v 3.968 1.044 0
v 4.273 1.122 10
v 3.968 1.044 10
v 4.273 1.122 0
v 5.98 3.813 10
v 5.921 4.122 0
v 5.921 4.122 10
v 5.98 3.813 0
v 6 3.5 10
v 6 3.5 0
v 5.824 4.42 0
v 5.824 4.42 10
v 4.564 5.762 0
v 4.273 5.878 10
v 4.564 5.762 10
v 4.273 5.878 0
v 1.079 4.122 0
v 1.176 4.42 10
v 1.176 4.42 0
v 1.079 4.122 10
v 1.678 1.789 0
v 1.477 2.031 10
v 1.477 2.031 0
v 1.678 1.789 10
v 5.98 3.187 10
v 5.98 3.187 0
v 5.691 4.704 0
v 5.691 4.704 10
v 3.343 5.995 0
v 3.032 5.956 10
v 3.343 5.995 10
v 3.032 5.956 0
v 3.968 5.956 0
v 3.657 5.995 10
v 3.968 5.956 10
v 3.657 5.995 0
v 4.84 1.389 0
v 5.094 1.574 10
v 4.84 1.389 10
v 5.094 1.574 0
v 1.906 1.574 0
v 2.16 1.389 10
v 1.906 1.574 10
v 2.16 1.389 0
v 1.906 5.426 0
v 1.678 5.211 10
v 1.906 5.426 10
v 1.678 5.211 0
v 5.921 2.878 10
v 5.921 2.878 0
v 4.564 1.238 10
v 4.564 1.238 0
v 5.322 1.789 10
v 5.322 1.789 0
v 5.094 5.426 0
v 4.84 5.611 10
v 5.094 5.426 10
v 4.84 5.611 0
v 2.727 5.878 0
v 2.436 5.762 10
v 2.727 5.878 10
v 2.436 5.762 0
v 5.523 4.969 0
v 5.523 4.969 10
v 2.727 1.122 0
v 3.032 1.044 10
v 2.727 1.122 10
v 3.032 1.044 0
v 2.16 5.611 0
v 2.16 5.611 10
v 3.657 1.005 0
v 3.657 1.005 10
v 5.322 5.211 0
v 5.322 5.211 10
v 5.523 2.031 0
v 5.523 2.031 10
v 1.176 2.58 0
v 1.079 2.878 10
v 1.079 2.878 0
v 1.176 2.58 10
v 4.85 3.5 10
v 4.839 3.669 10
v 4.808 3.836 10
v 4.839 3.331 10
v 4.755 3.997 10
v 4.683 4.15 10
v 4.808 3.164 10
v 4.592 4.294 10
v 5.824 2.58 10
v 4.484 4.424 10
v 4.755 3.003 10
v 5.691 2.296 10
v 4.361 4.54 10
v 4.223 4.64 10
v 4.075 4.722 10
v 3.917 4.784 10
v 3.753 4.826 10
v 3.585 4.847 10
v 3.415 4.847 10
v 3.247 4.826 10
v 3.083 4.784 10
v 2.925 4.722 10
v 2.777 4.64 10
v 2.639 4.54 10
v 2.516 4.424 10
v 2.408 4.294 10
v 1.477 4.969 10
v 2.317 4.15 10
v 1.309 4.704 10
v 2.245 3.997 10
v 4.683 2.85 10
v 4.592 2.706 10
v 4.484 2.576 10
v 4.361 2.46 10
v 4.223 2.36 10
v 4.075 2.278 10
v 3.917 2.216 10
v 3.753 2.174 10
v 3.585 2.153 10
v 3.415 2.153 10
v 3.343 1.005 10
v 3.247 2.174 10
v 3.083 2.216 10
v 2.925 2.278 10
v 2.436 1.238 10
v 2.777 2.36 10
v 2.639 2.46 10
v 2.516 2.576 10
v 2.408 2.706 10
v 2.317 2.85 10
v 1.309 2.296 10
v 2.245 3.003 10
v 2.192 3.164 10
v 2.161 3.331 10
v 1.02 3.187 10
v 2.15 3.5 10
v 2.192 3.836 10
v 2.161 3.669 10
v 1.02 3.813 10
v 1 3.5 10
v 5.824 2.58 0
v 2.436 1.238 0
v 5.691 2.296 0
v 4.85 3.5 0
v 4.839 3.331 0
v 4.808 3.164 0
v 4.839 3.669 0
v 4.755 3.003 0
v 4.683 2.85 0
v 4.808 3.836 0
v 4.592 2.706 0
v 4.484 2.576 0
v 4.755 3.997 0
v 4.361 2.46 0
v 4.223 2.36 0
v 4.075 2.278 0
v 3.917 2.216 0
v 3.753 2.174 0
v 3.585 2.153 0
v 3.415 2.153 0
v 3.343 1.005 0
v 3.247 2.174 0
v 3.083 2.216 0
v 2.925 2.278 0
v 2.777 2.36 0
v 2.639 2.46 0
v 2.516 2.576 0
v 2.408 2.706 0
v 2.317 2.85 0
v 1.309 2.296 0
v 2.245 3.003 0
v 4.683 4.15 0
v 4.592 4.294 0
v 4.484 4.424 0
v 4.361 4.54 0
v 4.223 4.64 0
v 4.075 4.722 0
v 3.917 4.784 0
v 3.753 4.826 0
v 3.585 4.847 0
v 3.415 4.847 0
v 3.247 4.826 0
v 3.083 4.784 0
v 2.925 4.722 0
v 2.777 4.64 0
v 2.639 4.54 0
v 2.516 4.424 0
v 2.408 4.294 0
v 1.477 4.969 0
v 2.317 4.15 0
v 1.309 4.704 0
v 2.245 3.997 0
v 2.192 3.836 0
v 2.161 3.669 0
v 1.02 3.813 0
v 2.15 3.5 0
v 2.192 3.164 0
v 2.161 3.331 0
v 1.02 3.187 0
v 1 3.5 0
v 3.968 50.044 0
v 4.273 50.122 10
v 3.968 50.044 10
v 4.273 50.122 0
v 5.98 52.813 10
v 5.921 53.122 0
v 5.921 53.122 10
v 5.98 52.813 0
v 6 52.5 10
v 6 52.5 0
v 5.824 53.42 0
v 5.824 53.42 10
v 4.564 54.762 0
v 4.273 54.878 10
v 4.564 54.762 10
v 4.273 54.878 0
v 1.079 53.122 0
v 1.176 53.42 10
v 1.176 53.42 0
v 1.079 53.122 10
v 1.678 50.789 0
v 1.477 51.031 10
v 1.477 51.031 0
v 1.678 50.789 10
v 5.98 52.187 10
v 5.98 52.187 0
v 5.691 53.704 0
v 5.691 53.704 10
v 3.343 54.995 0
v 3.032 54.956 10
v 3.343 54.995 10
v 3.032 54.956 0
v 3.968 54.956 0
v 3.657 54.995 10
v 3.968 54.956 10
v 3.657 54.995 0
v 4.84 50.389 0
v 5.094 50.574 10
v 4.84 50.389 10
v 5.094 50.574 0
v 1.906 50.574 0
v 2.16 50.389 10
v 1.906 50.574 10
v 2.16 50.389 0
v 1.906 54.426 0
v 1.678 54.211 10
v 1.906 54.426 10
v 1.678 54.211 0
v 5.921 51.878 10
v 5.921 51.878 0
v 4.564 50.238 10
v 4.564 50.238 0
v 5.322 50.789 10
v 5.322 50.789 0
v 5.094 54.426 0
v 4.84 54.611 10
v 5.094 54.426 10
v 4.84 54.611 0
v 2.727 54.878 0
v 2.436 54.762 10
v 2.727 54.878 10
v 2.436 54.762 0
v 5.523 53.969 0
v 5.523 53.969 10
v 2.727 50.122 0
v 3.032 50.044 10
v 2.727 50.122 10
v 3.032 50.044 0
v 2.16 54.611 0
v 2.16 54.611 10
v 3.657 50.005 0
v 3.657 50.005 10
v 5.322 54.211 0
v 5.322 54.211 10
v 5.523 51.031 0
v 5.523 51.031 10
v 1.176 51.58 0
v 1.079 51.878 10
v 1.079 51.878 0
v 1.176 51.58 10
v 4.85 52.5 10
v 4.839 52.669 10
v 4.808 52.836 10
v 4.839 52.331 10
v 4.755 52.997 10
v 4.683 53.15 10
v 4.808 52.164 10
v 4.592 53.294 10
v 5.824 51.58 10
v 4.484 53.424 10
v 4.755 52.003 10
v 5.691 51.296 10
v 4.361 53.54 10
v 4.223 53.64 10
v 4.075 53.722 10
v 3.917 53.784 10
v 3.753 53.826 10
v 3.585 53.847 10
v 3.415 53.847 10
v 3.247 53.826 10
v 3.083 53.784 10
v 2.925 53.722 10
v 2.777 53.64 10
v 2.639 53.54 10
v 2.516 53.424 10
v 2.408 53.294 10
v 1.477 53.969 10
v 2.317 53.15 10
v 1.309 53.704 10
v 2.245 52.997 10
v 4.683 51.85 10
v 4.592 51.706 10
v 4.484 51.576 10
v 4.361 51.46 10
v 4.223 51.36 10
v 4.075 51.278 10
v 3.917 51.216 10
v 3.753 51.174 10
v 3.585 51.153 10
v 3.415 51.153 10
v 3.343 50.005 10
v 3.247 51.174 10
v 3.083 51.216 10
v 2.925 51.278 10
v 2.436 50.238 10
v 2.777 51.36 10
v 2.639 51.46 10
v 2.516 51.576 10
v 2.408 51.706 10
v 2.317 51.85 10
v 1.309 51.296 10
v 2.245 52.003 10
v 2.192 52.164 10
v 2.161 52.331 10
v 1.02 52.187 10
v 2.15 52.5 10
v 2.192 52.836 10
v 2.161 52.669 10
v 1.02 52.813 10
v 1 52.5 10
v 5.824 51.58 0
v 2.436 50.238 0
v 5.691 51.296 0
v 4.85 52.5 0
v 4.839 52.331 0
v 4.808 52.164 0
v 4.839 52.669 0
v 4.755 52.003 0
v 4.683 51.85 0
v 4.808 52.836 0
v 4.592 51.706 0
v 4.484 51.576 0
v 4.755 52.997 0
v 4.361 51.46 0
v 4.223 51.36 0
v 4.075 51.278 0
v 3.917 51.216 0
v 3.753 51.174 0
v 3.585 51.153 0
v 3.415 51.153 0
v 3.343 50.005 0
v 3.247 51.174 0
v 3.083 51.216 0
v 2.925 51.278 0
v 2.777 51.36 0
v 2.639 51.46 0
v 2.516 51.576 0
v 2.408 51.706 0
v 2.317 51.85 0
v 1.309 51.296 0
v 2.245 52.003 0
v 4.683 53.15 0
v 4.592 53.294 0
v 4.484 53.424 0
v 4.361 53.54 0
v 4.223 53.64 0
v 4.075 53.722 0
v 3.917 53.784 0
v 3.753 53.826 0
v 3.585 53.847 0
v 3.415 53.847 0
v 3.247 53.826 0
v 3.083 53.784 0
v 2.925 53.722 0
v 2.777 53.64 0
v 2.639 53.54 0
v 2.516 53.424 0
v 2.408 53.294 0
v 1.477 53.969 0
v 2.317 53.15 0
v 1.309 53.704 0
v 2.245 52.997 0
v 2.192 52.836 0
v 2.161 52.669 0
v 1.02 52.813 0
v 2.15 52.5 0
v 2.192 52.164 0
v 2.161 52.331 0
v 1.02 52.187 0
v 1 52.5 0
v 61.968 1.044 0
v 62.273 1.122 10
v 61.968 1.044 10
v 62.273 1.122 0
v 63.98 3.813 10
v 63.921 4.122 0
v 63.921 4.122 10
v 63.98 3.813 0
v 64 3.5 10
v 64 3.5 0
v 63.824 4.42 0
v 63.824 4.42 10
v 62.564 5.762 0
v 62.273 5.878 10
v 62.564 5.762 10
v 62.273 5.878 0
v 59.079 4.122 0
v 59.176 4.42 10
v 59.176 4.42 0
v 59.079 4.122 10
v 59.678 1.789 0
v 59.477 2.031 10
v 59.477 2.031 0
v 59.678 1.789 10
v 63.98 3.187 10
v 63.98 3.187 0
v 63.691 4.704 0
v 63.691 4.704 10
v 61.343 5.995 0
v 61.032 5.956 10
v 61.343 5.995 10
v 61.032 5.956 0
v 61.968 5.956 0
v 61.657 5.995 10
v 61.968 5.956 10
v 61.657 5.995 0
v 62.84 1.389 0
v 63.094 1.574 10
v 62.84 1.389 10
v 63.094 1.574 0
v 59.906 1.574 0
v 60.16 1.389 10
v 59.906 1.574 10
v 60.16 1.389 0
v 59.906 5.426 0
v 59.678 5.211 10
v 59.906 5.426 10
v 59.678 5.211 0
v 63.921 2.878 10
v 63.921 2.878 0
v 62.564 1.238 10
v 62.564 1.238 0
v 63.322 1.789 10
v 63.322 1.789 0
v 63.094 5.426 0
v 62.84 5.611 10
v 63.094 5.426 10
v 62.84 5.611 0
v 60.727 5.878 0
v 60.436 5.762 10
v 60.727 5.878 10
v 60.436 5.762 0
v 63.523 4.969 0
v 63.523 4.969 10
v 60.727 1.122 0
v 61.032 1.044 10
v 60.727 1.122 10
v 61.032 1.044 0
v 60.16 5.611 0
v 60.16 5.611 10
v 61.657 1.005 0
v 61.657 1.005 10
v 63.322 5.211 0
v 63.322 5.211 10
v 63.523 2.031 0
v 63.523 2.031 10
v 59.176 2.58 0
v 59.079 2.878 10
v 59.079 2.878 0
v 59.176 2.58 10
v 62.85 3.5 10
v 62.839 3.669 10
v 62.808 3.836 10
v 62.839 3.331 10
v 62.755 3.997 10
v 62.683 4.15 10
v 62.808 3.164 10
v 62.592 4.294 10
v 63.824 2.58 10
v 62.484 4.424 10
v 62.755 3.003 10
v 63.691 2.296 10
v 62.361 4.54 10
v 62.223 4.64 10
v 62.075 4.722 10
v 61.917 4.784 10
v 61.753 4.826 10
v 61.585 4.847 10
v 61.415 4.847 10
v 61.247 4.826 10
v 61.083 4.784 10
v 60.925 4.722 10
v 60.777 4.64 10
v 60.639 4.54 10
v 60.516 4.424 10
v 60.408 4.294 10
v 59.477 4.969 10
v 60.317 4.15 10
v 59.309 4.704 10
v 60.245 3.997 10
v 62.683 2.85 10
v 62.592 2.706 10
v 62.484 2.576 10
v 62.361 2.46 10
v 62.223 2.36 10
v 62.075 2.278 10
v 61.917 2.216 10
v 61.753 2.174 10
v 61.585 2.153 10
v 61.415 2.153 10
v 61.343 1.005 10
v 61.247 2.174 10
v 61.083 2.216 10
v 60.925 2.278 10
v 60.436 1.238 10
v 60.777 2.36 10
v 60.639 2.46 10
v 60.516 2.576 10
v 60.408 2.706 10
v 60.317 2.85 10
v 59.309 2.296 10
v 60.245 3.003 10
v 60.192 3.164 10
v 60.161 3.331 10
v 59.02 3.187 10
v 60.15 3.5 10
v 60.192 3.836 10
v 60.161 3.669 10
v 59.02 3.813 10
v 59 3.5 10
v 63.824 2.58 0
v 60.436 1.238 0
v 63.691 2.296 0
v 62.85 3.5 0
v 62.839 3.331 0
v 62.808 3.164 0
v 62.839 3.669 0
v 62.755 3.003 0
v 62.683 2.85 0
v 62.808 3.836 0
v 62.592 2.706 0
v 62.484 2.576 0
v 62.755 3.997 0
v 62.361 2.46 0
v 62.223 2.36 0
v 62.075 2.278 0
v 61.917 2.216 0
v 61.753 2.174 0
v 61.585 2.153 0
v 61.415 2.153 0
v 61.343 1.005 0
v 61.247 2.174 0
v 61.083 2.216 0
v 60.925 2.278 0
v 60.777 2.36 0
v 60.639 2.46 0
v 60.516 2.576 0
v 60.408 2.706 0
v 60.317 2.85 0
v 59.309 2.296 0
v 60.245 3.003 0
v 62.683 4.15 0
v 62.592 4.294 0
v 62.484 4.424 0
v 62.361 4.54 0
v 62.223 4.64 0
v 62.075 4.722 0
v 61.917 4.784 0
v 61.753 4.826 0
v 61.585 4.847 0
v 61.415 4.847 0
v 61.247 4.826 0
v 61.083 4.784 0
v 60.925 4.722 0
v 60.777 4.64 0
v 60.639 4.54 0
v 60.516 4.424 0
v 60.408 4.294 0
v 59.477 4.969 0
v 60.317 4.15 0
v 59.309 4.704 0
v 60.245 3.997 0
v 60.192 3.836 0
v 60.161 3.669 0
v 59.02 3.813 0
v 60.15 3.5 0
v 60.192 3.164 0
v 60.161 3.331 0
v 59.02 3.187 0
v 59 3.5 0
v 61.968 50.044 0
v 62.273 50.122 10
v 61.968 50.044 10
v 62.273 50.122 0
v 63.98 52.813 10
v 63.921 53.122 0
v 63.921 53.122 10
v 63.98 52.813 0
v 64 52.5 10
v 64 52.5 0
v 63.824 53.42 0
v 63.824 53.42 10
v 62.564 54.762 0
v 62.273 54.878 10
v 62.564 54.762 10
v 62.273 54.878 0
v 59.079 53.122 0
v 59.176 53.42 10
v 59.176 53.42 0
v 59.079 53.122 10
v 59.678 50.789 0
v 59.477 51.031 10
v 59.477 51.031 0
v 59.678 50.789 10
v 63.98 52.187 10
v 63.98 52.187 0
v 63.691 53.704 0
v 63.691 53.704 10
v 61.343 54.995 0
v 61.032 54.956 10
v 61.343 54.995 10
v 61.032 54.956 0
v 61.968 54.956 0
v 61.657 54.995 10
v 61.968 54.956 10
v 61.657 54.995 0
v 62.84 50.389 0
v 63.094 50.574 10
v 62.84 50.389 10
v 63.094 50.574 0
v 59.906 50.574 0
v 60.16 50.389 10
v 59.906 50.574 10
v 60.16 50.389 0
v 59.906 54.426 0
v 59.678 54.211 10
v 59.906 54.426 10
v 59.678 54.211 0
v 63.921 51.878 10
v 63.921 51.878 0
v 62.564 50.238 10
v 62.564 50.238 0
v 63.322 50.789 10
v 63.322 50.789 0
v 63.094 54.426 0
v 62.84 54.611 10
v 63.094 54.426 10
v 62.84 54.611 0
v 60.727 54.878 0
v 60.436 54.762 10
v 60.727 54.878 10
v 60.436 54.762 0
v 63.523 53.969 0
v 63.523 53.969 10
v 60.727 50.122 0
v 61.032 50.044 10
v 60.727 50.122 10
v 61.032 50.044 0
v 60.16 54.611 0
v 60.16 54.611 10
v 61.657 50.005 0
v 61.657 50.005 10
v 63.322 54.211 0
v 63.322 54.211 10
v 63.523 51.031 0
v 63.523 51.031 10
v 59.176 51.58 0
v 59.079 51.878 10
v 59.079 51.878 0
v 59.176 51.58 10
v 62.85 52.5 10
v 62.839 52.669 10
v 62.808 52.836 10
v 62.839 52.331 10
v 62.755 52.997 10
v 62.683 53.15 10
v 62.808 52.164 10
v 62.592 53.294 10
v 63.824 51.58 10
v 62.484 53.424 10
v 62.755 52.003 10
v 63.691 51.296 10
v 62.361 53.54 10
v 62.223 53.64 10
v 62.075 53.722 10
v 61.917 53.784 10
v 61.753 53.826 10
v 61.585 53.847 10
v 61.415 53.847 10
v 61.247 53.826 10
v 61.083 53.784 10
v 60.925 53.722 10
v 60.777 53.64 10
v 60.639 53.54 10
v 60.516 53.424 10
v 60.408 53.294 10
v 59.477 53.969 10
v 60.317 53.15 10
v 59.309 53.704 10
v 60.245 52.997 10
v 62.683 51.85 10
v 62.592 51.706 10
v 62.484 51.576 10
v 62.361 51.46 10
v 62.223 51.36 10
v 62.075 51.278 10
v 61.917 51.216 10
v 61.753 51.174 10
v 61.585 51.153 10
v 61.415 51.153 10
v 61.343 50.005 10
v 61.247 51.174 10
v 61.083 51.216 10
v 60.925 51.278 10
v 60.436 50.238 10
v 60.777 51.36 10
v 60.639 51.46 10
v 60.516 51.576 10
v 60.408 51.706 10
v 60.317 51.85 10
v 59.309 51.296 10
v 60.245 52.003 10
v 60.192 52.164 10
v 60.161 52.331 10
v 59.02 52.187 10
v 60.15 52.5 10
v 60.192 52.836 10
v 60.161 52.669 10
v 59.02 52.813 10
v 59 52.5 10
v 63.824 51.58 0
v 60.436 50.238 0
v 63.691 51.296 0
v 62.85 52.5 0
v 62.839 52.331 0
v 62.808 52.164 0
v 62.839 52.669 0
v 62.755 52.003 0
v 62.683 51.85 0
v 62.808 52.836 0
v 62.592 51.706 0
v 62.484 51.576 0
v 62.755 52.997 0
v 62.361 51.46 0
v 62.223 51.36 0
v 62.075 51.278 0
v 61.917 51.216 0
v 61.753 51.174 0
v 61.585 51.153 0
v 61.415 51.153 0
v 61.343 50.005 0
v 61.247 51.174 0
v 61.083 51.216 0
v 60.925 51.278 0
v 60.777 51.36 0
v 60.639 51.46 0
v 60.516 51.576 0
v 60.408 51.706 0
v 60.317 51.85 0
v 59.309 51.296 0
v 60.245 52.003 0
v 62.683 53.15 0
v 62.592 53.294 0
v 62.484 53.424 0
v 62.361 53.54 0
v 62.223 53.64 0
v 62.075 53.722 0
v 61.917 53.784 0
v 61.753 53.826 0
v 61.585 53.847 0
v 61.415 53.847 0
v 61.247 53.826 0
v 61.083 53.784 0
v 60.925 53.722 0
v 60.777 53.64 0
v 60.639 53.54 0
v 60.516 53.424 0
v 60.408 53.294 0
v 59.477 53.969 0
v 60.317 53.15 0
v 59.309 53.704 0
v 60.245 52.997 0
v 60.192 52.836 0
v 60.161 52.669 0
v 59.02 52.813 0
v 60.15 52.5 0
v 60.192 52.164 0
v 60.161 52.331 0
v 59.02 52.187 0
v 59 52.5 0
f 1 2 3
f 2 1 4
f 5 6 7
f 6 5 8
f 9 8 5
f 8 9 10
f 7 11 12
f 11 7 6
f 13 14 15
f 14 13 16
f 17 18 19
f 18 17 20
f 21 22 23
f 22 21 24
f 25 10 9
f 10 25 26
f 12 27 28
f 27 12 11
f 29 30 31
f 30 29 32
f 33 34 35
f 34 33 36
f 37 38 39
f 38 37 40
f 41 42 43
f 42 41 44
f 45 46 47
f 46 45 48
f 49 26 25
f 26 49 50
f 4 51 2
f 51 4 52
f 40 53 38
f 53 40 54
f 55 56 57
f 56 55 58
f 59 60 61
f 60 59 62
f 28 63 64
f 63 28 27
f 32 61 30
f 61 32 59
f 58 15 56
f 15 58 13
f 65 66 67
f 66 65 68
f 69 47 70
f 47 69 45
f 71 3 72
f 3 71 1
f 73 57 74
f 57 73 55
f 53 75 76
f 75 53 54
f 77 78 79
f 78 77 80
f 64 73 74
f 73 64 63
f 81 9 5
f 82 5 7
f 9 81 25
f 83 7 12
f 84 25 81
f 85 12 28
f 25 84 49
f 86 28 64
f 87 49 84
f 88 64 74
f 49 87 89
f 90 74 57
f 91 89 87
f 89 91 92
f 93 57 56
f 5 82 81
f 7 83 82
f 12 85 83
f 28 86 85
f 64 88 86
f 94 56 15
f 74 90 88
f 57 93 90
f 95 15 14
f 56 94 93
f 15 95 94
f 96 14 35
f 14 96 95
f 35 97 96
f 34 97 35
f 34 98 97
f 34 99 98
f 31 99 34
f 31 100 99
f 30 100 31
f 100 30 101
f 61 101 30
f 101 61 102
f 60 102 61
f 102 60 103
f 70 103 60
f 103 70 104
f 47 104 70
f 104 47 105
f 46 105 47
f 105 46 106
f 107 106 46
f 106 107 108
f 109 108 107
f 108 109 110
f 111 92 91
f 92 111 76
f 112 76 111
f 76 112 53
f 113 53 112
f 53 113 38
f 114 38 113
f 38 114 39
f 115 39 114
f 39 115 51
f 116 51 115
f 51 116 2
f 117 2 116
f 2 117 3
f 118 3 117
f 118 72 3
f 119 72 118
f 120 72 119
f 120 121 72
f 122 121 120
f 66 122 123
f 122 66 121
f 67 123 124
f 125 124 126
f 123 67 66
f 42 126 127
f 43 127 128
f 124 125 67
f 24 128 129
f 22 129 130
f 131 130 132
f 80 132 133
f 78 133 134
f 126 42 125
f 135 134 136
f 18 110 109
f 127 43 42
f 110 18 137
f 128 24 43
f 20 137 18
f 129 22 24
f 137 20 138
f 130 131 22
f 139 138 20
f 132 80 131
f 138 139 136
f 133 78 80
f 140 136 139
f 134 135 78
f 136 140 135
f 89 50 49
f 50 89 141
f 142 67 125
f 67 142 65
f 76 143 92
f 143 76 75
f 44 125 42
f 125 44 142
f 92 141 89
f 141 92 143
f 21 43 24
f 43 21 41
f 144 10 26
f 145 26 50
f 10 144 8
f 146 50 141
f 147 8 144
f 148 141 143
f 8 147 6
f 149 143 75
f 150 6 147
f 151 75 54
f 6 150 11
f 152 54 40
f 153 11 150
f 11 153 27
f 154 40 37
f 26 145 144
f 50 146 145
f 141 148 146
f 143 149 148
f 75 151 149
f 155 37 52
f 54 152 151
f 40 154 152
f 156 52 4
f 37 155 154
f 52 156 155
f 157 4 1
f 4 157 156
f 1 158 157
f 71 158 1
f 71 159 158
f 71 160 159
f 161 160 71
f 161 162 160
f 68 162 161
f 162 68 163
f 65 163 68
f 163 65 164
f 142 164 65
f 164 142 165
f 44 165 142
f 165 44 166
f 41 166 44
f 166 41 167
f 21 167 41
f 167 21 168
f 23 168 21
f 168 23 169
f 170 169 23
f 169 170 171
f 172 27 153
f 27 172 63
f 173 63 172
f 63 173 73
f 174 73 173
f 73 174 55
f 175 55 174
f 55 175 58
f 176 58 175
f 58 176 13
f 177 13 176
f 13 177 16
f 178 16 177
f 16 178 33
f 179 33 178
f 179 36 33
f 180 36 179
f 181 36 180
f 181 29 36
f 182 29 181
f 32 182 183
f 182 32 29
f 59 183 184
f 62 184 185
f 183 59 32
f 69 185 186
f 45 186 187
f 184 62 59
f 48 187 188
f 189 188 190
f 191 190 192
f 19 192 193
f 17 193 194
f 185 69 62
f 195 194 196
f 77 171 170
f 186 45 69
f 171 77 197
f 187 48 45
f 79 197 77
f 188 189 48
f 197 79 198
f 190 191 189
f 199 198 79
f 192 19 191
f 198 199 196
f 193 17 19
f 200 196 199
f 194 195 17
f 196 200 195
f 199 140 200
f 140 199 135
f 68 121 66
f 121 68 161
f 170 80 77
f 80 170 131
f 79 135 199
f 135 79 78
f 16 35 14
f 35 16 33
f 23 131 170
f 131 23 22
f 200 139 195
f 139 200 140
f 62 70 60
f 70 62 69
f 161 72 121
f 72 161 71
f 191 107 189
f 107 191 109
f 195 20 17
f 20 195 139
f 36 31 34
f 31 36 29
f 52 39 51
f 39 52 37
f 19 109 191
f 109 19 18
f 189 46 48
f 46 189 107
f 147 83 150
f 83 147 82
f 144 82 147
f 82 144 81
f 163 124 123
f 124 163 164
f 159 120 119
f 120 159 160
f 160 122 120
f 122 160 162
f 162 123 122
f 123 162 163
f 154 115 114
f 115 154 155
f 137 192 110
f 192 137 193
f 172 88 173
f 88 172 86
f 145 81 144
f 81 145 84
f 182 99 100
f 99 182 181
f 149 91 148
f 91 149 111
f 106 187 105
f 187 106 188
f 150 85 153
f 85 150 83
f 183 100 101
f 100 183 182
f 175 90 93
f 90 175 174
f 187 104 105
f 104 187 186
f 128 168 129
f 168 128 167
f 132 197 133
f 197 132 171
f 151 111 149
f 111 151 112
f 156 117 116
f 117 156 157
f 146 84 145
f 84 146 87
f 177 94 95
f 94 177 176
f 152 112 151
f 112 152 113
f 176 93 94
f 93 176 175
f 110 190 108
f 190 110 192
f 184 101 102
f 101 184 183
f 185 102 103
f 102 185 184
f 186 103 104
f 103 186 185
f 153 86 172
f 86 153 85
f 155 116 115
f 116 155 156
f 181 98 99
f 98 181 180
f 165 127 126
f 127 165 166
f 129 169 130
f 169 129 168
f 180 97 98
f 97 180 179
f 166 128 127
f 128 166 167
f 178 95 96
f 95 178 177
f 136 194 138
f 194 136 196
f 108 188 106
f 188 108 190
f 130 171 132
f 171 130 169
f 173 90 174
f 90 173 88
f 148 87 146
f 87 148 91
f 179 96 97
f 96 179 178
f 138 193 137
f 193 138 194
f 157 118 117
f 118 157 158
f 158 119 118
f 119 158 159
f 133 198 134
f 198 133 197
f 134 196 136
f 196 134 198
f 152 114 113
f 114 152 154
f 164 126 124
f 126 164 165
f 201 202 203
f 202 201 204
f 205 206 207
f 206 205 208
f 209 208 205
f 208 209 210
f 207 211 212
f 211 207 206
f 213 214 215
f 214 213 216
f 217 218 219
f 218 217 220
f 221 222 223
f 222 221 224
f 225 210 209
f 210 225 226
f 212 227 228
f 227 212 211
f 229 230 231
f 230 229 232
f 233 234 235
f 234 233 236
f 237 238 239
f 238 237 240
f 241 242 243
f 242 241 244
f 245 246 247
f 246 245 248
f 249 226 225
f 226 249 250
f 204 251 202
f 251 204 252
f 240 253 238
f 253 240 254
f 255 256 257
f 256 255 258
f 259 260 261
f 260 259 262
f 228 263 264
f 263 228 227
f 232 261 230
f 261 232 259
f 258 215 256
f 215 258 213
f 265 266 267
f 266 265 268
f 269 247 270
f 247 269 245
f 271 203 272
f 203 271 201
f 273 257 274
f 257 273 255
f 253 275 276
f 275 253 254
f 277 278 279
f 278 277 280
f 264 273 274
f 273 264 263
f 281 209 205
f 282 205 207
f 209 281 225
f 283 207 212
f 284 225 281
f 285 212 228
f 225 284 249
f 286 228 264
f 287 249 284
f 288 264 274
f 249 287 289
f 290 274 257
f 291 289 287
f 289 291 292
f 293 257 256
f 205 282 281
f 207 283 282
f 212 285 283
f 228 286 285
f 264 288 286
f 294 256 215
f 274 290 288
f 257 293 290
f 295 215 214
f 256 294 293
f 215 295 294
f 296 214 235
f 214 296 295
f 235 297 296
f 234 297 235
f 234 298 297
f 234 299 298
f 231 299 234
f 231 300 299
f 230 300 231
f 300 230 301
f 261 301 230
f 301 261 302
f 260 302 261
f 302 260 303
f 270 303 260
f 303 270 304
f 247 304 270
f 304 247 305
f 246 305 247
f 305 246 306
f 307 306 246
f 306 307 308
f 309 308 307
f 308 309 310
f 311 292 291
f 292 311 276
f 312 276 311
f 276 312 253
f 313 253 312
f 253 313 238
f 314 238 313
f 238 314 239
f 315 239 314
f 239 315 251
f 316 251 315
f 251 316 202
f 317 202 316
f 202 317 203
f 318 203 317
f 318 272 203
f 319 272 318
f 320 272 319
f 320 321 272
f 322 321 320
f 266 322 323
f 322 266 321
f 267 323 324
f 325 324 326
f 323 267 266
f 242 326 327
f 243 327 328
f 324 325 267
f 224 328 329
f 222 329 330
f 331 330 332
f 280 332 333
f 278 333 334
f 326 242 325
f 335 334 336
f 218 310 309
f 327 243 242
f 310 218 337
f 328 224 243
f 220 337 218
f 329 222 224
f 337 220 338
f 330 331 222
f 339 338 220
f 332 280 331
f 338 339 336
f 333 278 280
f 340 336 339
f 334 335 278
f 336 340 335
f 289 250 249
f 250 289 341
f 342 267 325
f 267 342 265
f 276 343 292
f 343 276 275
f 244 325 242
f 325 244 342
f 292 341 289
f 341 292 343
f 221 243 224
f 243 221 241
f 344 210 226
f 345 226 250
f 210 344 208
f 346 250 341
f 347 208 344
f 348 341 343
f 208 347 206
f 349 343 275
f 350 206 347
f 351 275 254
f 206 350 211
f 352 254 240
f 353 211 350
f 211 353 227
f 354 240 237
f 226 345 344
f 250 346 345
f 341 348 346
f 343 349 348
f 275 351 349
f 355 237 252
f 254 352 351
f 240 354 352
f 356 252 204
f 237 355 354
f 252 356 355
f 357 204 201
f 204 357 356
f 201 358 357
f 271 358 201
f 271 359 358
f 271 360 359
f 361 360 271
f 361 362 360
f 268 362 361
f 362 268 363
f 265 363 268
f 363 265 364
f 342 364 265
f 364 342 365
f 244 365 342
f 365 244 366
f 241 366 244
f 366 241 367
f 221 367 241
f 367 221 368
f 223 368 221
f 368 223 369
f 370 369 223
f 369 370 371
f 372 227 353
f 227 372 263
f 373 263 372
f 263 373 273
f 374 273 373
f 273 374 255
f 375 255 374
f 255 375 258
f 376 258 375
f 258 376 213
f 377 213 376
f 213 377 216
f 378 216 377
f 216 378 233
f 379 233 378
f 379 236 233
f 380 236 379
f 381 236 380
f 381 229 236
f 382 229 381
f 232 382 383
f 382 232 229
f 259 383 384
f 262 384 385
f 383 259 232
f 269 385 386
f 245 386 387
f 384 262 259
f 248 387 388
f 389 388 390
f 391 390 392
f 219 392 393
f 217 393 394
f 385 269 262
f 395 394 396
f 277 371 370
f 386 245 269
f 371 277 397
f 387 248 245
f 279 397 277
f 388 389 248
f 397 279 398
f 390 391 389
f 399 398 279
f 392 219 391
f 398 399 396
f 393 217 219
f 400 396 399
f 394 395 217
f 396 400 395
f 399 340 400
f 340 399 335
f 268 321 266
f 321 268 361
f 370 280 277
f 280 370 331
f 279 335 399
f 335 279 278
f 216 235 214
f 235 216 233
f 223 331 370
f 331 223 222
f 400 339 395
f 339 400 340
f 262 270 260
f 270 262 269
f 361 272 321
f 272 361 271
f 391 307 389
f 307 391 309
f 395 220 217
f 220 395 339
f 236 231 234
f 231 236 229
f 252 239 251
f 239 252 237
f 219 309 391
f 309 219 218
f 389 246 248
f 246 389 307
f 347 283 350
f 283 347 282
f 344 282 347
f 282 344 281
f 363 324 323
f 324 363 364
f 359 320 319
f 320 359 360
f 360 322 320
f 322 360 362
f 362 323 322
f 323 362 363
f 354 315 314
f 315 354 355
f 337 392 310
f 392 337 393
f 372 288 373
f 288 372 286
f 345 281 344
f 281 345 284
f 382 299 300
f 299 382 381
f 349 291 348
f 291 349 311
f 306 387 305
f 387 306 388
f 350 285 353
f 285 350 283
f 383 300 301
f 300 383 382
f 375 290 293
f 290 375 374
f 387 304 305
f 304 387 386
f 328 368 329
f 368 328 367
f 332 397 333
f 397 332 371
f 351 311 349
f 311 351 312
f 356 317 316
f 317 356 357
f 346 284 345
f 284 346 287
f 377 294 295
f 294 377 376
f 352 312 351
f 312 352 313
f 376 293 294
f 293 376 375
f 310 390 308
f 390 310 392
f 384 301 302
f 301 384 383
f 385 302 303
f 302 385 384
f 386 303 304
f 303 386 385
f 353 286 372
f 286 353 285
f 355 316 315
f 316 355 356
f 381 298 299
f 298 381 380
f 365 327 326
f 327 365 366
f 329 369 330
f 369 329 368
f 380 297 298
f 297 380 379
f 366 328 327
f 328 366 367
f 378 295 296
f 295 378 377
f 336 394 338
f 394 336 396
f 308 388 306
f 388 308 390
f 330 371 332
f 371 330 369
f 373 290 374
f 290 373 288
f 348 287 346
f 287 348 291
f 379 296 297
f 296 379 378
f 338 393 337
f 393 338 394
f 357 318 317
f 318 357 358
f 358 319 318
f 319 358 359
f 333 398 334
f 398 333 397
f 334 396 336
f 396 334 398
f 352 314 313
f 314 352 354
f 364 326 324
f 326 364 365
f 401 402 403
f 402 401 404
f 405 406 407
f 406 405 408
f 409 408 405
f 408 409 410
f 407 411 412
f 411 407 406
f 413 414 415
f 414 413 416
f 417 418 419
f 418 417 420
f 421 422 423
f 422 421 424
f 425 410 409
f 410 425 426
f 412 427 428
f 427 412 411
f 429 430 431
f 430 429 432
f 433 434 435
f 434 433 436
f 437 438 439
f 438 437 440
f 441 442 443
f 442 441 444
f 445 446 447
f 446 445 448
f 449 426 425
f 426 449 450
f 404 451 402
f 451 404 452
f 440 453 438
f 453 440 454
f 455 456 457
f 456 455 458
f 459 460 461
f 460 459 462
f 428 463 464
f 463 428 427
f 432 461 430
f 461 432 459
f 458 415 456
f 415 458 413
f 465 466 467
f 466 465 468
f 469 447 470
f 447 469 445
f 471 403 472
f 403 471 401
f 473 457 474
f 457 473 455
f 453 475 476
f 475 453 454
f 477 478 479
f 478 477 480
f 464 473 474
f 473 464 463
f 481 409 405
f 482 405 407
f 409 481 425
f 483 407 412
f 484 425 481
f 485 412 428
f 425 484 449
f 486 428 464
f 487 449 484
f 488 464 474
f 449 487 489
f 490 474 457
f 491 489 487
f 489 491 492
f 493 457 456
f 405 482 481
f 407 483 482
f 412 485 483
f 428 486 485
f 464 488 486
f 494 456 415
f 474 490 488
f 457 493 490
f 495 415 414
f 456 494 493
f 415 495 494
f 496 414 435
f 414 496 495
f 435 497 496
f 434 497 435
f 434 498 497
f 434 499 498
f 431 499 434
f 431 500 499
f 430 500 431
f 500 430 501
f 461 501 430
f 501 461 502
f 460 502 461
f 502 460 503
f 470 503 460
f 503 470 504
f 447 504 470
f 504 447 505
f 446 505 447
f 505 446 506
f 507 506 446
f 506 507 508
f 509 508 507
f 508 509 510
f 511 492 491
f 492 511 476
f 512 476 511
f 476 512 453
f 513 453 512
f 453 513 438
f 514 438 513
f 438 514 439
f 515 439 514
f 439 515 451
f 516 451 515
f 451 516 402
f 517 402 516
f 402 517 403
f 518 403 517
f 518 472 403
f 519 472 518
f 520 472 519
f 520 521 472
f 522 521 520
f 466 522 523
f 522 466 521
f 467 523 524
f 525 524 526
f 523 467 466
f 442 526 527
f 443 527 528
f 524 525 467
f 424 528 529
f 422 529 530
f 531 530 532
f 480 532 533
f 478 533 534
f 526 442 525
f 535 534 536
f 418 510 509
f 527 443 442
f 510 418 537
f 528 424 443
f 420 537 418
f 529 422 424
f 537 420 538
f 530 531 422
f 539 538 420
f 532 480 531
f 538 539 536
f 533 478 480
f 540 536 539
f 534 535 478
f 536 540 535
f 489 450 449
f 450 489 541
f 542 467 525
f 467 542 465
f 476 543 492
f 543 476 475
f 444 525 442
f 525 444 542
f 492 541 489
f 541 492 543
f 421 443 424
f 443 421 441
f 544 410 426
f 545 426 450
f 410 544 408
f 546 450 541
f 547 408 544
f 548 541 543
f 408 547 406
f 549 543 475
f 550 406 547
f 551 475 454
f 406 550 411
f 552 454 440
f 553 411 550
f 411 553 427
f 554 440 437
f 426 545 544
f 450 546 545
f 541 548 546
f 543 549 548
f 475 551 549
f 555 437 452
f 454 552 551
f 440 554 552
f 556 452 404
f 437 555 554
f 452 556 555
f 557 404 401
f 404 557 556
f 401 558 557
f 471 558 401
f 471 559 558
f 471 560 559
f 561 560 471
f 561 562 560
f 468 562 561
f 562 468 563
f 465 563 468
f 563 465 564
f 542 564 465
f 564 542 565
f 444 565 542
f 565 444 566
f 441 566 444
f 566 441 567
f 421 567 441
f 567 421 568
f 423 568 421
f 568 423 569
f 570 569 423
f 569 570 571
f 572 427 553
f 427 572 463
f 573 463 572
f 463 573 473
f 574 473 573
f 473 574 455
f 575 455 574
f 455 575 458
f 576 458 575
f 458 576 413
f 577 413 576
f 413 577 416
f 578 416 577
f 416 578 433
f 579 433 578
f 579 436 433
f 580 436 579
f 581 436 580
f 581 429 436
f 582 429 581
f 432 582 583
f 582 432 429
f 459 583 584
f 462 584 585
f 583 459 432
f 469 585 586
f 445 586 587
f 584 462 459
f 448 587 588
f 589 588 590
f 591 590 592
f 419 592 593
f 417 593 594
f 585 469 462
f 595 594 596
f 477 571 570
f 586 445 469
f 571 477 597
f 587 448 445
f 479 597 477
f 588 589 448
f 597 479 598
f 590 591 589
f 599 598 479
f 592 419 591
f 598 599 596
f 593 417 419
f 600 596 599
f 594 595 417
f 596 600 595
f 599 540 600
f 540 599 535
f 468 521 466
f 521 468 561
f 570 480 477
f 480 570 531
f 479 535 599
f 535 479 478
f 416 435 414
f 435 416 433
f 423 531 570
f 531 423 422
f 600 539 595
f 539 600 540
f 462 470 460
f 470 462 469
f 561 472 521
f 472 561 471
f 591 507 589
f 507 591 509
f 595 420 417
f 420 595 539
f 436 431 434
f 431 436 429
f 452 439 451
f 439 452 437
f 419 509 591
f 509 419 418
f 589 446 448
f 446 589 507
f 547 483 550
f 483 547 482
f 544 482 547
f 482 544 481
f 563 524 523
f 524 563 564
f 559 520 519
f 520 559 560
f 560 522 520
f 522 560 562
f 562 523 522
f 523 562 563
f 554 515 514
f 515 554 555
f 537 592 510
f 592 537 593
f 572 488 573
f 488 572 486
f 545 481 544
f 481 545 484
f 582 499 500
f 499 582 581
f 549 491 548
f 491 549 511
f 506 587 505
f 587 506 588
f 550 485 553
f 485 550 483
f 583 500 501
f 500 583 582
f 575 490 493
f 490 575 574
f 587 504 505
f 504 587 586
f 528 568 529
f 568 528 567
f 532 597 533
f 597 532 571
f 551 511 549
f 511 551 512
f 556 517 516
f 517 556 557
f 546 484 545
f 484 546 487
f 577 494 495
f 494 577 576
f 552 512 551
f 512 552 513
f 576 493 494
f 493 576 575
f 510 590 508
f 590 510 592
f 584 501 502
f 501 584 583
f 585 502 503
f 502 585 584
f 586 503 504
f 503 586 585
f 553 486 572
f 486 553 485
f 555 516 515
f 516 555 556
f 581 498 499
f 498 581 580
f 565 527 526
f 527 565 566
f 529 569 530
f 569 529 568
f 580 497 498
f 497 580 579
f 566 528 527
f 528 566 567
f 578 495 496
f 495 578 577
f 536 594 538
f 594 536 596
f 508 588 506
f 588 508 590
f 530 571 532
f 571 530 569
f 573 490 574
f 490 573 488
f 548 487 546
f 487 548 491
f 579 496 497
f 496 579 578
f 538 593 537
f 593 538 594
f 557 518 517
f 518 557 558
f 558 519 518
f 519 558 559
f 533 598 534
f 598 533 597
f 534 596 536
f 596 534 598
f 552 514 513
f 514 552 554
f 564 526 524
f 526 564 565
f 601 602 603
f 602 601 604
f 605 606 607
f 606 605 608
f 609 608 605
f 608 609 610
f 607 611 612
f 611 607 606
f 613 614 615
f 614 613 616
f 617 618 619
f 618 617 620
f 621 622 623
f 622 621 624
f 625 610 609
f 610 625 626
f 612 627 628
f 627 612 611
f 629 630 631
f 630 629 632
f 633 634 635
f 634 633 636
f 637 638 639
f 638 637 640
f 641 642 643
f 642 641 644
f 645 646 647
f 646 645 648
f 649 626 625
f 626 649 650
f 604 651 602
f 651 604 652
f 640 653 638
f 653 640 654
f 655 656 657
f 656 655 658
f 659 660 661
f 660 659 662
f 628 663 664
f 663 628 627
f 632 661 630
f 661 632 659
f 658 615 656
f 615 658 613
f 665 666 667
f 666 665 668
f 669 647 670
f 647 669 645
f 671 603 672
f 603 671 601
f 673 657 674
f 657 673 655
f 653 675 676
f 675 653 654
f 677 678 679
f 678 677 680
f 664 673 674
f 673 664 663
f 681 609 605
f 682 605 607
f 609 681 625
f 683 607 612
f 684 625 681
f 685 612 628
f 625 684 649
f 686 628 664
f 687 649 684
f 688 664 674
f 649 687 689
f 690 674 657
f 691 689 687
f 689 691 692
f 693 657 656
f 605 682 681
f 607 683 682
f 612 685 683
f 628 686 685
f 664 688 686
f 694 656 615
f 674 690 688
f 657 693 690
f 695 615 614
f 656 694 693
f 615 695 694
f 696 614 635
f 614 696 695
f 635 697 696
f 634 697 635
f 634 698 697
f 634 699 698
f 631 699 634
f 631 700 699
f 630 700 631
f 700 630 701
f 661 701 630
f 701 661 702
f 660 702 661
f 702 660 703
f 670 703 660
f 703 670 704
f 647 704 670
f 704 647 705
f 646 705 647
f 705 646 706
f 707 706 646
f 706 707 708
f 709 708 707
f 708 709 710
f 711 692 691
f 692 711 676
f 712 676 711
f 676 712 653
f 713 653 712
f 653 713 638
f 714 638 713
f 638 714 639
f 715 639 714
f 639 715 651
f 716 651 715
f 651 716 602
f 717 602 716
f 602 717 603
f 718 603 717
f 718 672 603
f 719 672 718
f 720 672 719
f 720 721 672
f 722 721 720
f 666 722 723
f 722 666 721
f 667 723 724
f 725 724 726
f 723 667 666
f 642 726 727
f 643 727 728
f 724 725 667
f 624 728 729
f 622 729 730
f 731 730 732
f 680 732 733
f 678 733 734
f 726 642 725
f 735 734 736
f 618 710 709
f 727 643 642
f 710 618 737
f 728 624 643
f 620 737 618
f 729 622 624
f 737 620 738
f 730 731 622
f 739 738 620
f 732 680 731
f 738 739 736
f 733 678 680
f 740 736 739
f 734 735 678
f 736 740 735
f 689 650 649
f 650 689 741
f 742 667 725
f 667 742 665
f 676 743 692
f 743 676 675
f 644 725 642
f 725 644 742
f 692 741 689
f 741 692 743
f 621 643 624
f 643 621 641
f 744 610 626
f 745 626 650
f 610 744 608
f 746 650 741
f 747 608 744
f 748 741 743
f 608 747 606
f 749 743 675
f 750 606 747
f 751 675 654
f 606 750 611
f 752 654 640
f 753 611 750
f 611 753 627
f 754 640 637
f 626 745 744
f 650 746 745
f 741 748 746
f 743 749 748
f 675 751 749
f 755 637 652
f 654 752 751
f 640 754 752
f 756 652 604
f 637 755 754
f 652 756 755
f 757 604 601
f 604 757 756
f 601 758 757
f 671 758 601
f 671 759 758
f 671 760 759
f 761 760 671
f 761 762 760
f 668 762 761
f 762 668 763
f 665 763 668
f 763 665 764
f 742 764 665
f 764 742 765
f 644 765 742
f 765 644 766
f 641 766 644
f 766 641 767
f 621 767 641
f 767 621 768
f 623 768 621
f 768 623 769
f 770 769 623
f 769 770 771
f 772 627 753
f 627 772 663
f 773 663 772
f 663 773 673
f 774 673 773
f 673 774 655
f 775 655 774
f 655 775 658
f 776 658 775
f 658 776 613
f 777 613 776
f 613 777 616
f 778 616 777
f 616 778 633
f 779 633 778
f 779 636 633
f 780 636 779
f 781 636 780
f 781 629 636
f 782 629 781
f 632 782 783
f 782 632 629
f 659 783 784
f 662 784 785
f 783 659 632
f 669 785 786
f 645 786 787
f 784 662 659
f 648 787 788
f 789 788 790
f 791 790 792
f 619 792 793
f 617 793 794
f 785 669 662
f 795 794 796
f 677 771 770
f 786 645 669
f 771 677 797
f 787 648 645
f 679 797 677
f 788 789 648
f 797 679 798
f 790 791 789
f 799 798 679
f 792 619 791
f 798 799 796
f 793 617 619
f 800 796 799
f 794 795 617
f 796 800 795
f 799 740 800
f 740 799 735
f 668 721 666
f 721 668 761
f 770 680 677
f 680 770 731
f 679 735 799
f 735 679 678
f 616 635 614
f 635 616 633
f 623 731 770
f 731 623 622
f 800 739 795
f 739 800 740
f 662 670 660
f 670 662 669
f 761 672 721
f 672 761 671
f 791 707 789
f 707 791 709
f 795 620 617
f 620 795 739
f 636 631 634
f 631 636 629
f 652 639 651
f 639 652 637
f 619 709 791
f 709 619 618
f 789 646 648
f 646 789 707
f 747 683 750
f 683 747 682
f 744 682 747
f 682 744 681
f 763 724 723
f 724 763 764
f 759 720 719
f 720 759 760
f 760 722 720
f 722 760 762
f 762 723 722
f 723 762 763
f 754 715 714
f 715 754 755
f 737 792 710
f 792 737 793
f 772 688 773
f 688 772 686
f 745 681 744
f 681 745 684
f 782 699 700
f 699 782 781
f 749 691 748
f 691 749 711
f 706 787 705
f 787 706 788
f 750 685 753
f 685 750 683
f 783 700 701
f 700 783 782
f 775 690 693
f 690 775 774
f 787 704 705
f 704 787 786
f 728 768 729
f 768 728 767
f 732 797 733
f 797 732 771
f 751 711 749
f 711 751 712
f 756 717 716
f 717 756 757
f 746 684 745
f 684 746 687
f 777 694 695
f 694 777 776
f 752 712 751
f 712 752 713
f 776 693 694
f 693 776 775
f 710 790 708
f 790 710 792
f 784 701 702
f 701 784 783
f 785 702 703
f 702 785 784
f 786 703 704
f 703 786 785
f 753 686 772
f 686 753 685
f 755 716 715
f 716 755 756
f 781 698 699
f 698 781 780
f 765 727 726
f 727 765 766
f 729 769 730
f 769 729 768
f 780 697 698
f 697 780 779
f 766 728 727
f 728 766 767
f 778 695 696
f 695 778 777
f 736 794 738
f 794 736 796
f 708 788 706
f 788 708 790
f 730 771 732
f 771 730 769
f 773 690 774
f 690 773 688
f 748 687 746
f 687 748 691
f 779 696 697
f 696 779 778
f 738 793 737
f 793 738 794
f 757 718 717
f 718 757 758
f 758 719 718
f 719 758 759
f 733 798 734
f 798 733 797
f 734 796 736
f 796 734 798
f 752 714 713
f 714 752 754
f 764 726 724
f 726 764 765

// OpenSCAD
linear_extrude(2)
	import("../dxf/RPi_3A.dxf", $fn=50);

//support fo 2.5mm scolls
translate([3.5,3.5,0])
difference(){
		cylinder(10,2.5,2.5, $fn=50);
		cylinder(12,1.35,1.35, $fn=50);
}

translate([3.5,52.5,0])
difference(){
		cylinder(10,2.5,2.5, $fn=50);
		cylinder(12,1.35,1.35, $fn=50);
}

translate([61.5,3.5,0])
difference(){
		cylinder(10,2.5,2.5, $fn=50);
		cylinder(12,1.35,1.35, $fn=50);
}

translate([61.5,52.5,0])
difference(){
		cylinder(10,2.5,2.5, $fn=50);
		cylinder(12,1.35,1.35, $fn=50);
}
